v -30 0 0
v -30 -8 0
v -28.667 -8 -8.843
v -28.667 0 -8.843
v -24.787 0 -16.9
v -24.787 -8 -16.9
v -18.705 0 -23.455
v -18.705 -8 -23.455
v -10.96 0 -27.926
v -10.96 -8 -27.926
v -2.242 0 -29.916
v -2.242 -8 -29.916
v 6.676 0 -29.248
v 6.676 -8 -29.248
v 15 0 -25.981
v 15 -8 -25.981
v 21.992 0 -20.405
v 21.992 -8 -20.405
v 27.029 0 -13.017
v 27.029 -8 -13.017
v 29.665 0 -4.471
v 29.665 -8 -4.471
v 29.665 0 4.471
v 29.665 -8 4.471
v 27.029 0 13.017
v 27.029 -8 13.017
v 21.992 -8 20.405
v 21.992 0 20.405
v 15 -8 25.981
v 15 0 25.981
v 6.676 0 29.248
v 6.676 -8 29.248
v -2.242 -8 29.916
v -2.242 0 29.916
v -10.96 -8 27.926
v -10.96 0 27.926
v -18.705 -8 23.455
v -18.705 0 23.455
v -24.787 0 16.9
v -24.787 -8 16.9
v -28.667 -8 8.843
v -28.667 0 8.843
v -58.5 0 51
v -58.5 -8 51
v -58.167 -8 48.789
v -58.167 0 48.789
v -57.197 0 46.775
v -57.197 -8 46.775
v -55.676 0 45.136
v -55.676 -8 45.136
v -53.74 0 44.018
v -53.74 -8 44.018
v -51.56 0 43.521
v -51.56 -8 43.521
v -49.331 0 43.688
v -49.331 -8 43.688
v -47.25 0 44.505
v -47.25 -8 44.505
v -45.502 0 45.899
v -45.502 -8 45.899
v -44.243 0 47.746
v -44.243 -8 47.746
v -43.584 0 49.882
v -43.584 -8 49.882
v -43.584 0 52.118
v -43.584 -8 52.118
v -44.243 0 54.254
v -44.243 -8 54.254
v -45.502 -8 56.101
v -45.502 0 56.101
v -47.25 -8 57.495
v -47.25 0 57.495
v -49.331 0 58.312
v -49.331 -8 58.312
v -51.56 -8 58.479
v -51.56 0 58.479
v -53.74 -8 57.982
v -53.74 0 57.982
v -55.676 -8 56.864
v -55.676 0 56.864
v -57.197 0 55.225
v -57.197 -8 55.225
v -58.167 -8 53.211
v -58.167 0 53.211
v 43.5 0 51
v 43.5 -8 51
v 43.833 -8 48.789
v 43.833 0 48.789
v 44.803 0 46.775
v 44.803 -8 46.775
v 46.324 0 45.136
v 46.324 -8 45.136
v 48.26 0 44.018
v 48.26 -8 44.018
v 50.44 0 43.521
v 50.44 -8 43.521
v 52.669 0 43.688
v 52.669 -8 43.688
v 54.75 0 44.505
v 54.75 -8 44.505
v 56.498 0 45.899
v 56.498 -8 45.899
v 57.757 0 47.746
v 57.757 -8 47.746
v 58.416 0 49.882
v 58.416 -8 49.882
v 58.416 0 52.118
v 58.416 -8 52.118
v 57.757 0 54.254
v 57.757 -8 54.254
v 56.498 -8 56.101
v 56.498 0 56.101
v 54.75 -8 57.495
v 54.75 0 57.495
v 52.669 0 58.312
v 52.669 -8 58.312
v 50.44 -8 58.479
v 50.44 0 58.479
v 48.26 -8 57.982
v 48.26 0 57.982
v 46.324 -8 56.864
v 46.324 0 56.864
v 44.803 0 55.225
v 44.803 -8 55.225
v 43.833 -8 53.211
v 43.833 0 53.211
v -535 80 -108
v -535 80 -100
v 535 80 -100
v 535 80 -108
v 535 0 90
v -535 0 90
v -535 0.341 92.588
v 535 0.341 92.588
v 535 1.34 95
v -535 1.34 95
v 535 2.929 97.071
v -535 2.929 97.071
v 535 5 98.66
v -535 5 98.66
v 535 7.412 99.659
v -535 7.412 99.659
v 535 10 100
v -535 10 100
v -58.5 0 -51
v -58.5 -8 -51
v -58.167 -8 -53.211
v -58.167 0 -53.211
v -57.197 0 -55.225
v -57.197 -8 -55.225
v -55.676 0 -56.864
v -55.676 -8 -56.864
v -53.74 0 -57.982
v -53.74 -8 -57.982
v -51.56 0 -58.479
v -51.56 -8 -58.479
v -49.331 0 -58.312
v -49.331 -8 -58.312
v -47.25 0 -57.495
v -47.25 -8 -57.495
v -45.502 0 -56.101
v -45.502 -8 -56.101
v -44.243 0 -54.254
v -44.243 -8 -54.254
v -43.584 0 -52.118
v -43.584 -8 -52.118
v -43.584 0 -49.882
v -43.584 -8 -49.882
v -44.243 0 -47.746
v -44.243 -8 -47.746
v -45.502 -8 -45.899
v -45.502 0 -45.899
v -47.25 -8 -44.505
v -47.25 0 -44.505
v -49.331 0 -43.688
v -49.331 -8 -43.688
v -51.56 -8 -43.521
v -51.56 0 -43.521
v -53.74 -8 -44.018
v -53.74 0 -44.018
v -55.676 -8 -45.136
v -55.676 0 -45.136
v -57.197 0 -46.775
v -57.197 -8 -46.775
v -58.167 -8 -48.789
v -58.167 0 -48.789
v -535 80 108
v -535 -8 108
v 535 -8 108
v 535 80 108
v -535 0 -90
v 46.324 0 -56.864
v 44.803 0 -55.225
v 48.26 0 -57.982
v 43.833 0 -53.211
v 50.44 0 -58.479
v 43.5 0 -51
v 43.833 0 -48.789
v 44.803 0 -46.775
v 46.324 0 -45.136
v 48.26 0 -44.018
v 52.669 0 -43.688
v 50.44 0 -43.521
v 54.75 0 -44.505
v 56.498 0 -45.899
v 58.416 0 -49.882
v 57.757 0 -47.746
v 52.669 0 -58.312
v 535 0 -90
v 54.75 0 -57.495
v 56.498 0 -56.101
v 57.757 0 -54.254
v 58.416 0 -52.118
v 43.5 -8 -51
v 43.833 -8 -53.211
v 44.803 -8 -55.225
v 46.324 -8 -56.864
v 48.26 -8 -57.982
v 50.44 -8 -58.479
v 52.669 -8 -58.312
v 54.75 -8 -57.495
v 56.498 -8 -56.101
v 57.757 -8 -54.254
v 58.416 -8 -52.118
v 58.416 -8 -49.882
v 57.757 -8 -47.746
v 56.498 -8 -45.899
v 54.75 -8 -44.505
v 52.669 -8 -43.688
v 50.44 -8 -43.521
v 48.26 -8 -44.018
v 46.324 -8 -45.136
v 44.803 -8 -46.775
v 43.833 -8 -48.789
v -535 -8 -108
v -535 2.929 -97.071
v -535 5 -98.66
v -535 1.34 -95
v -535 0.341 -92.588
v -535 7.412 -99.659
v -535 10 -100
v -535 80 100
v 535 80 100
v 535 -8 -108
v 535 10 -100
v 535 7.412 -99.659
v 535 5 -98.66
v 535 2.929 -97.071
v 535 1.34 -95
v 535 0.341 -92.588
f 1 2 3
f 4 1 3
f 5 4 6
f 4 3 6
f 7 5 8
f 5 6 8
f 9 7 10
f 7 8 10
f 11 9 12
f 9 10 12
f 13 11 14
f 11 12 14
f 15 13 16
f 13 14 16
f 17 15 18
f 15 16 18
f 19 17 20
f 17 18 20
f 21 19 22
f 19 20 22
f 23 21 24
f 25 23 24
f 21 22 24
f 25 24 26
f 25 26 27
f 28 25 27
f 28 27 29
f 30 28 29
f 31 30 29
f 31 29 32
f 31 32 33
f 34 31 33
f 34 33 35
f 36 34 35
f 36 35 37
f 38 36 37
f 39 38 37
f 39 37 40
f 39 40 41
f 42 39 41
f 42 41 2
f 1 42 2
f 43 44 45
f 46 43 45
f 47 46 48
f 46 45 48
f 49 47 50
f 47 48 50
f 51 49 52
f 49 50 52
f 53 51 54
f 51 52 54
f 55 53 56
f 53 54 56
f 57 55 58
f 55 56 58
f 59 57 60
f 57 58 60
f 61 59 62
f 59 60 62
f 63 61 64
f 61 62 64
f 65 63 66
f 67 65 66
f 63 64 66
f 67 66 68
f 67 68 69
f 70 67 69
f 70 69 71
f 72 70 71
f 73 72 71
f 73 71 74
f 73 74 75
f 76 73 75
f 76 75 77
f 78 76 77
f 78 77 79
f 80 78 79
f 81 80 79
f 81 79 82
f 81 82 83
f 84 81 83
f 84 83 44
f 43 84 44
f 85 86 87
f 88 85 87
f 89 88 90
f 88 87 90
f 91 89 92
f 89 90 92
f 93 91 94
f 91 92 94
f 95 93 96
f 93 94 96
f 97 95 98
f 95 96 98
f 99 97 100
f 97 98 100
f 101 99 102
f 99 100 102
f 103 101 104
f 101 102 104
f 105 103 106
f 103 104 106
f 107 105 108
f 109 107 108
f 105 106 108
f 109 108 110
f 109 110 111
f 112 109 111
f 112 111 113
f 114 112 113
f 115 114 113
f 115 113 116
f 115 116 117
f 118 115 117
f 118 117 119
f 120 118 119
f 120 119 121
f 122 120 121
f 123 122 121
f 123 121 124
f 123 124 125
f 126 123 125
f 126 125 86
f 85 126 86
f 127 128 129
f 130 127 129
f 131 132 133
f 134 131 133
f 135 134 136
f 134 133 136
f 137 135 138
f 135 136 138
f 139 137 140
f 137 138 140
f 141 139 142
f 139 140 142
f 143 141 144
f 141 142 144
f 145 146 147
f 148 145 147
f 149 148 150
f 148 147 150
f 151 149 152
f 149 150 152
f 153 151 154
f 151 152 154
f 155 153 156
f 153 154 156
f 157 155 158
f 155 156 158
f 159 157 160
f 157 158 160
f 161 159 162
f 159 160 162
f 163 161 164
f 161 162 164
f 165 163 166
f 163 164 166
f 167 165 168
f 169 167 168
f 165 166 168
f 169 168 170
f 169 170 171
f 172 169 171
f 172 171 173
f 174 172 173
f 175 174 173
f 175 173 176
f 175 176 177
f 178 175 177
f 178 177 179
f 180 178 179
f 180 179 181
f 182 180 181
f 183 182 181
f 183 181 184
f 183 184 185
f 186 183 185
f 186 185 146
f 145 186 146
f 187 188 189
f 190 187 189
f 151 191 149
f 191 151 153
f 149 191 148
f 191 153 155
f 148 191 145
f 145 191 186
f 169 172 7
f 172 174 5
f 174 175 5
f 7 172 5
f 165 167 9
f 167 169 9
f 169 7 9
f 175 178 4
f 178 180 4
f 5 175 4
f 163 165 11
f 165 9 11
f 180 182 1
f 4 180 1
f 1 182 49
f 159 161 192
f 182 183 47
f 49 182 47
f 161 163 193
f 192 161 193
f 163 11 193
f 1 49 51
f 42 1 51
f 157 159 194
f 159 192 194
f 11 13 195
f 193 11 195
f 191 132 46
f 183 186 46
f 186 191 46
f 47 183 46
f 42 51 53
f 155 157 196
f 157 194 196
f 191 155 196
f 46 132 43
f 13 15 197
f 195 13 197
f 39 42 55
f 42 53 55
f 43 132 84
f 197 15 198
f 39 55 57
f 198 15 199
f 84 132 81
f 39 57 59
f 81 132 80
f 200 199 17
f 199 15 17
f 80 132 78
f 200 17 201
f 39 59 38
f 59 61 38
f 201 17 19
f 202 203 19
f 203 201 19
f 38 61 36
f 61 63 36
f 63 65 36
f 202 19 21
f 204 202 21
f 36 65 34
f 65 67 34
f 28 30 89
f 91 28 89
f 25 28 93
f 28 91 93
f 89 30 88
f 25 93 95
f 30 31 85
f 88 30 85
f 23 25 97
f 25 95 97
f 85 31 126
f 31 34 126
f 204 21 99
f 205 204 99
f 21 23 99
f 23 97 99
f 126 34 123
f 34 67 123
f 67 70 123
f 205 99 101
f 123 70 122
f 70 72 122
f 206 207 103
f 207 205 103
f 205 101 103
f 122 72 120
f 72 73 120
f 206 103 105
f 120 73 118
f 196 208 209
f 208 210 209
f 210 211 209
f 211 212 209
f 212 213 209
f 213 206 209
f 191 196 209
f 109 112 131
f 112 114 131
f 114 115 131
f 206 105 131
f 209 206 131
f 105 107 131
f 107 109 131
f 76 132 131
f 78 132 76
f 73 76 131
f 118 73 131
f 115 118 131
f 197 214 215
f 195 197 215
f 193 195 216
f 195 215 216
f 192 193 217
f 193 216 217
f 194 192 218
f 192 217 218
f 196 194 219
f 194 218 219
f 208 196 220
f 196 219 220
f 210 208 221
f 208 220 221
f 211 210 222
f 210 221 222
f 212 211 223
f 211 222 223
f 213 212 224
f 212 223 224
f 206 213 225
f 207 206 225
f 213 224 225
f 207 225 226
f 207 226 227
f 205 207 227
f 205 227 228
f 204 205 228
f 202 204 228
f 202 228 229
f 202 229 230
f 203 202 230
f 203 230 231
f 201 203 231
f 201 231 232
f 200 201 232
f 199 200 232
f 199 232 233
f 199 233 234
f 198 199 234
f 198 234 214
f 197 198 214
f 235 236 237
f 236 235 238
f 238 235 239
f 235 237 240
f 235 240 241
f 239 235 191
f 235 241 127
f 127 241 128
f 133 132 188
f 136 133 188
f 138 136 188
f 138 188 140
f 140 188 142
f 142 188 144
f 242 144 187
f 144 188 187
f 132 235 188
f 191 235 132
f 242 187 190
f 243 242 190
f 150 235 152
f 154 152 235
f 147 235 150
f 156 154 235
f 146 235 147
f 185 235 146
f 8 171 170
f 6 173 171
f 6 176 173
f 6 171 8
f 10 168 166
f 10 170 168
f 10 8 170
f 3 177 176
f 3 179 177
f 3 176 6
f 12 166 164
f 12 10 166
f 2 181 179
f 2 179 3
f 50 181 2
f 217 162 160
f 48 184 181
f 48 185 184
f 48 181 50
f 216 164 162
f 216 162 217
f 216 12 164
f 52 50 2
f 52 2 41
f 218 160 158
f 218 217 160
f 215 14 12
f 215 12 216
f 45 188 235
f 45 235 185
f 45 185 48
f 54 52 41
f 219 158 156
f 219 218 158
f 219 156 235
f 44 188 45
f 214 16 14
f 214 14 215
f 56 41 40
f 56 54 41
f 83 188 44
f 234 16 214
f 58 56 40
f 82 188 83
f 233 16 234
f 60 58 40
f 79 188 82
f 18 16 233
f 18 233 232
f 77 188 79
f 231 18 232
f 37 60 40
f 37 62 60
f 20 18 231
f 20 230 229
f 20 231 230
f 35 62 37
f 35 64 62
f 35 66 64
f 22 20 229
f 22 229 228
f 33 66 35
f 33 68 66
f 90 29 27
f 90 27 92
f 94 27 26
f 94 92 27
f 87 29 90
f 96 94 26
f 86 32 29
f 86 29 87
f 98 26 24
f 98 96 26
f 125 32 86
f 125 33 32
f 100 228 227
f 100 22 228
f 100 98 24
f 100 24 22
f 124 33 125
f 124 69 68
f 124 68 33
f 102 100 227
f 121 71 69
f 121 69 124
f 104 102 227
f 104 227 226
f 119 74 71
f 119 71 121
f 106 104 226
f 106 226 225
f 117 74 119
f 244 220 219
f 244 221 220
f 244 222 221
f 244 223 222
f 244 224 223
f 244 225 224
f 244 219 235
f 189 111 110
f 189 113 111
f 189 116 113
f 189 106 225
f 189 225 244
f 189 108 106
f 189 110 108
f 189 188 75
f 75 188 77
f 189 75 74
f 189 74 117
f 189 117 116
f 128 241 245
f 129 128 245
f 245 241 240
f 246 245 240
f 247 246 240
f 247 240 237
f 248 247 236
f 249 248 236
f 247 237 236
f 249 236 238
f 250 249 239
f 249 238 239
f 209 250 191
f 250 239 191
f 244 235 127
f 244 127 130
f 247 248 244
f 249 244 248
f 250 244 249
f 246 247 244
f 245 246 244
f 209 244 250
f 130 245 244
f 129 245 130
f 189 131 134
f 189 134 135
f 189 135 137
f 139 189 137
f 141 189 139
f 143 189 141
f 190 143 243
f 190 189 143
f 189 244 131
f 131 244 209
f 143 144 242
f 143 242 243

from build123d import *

# Parameters (mm, degrees)
F0_W        = 1070
F0_H        = 200
F1_DEPTH    = 80
F2_T        = 8
F3_T1_DEPTH = 1070
F4_D        = 60
F5_D        = 15


# Not quite as in the source:
# - a fillet or chamfer that OpenCascade refuses, or shapes differently, is made with other operations: its cross-section is extruded or revolved along the edge and cut away or added


with BuildPart() as f1:
    # F0 (on Front) → F1 (new body)
    with BuildSketch(Plane.XZ):
        Rectangle(F0_W, F0_H)
    extrude(amount=-F1_DEPTH)

    # F2
    f2_openings = [f1.faces().sort_by_distance(p)[0] for p in [
        (0, 80, 0),
        (535, 40, 0),
        (-535, 40, 0),
    ]]
    offset(amount=F2_T, openings=f2_openings, kind=Kind.INTERSECTION)

    # F3: fillet of radius 10 on 2 edges, made by hand

    # F3_s2 → F3_t1 (join)
    with BuildSketch(Plane.YZ.offset(-535)):
        with BuildLine():
            ThreePointArc((10, -100), (2.9289321881, -97.0710678119), (0, -90))
            Line((0, -90), (0, -100))
            Line((0, -100), (10, -100))
        make_face()
        with BuildLine():
            ThreePointArc((0, 90), (2.9289321881, 97.0710678119), (10, 100))
            Line((10, 100), (0, 100))
            Line((0, 100), (0, 90))
        make_face()
    extrude(amount=F3_T1_DEPTH)

    # F4 (through all)
    with Locations(Plane(origin=(0, 0, 0), x_dir=(1, 0, 0), z_dir=(0, 1, 0))):
        with Locations((0, 0)):
            Hole(F4_D / 2)

    # F5 (through all)
    with Locations(Plane(origin=(0, 0, 0), x_dir=(1, 0, 0), z_dir=(0, 1, 0))):
        with Locations((-51, -51), (51, -51), (51, 51), (-51, 51)):
            Hole(F5_D / 2)


solid = f1.part
